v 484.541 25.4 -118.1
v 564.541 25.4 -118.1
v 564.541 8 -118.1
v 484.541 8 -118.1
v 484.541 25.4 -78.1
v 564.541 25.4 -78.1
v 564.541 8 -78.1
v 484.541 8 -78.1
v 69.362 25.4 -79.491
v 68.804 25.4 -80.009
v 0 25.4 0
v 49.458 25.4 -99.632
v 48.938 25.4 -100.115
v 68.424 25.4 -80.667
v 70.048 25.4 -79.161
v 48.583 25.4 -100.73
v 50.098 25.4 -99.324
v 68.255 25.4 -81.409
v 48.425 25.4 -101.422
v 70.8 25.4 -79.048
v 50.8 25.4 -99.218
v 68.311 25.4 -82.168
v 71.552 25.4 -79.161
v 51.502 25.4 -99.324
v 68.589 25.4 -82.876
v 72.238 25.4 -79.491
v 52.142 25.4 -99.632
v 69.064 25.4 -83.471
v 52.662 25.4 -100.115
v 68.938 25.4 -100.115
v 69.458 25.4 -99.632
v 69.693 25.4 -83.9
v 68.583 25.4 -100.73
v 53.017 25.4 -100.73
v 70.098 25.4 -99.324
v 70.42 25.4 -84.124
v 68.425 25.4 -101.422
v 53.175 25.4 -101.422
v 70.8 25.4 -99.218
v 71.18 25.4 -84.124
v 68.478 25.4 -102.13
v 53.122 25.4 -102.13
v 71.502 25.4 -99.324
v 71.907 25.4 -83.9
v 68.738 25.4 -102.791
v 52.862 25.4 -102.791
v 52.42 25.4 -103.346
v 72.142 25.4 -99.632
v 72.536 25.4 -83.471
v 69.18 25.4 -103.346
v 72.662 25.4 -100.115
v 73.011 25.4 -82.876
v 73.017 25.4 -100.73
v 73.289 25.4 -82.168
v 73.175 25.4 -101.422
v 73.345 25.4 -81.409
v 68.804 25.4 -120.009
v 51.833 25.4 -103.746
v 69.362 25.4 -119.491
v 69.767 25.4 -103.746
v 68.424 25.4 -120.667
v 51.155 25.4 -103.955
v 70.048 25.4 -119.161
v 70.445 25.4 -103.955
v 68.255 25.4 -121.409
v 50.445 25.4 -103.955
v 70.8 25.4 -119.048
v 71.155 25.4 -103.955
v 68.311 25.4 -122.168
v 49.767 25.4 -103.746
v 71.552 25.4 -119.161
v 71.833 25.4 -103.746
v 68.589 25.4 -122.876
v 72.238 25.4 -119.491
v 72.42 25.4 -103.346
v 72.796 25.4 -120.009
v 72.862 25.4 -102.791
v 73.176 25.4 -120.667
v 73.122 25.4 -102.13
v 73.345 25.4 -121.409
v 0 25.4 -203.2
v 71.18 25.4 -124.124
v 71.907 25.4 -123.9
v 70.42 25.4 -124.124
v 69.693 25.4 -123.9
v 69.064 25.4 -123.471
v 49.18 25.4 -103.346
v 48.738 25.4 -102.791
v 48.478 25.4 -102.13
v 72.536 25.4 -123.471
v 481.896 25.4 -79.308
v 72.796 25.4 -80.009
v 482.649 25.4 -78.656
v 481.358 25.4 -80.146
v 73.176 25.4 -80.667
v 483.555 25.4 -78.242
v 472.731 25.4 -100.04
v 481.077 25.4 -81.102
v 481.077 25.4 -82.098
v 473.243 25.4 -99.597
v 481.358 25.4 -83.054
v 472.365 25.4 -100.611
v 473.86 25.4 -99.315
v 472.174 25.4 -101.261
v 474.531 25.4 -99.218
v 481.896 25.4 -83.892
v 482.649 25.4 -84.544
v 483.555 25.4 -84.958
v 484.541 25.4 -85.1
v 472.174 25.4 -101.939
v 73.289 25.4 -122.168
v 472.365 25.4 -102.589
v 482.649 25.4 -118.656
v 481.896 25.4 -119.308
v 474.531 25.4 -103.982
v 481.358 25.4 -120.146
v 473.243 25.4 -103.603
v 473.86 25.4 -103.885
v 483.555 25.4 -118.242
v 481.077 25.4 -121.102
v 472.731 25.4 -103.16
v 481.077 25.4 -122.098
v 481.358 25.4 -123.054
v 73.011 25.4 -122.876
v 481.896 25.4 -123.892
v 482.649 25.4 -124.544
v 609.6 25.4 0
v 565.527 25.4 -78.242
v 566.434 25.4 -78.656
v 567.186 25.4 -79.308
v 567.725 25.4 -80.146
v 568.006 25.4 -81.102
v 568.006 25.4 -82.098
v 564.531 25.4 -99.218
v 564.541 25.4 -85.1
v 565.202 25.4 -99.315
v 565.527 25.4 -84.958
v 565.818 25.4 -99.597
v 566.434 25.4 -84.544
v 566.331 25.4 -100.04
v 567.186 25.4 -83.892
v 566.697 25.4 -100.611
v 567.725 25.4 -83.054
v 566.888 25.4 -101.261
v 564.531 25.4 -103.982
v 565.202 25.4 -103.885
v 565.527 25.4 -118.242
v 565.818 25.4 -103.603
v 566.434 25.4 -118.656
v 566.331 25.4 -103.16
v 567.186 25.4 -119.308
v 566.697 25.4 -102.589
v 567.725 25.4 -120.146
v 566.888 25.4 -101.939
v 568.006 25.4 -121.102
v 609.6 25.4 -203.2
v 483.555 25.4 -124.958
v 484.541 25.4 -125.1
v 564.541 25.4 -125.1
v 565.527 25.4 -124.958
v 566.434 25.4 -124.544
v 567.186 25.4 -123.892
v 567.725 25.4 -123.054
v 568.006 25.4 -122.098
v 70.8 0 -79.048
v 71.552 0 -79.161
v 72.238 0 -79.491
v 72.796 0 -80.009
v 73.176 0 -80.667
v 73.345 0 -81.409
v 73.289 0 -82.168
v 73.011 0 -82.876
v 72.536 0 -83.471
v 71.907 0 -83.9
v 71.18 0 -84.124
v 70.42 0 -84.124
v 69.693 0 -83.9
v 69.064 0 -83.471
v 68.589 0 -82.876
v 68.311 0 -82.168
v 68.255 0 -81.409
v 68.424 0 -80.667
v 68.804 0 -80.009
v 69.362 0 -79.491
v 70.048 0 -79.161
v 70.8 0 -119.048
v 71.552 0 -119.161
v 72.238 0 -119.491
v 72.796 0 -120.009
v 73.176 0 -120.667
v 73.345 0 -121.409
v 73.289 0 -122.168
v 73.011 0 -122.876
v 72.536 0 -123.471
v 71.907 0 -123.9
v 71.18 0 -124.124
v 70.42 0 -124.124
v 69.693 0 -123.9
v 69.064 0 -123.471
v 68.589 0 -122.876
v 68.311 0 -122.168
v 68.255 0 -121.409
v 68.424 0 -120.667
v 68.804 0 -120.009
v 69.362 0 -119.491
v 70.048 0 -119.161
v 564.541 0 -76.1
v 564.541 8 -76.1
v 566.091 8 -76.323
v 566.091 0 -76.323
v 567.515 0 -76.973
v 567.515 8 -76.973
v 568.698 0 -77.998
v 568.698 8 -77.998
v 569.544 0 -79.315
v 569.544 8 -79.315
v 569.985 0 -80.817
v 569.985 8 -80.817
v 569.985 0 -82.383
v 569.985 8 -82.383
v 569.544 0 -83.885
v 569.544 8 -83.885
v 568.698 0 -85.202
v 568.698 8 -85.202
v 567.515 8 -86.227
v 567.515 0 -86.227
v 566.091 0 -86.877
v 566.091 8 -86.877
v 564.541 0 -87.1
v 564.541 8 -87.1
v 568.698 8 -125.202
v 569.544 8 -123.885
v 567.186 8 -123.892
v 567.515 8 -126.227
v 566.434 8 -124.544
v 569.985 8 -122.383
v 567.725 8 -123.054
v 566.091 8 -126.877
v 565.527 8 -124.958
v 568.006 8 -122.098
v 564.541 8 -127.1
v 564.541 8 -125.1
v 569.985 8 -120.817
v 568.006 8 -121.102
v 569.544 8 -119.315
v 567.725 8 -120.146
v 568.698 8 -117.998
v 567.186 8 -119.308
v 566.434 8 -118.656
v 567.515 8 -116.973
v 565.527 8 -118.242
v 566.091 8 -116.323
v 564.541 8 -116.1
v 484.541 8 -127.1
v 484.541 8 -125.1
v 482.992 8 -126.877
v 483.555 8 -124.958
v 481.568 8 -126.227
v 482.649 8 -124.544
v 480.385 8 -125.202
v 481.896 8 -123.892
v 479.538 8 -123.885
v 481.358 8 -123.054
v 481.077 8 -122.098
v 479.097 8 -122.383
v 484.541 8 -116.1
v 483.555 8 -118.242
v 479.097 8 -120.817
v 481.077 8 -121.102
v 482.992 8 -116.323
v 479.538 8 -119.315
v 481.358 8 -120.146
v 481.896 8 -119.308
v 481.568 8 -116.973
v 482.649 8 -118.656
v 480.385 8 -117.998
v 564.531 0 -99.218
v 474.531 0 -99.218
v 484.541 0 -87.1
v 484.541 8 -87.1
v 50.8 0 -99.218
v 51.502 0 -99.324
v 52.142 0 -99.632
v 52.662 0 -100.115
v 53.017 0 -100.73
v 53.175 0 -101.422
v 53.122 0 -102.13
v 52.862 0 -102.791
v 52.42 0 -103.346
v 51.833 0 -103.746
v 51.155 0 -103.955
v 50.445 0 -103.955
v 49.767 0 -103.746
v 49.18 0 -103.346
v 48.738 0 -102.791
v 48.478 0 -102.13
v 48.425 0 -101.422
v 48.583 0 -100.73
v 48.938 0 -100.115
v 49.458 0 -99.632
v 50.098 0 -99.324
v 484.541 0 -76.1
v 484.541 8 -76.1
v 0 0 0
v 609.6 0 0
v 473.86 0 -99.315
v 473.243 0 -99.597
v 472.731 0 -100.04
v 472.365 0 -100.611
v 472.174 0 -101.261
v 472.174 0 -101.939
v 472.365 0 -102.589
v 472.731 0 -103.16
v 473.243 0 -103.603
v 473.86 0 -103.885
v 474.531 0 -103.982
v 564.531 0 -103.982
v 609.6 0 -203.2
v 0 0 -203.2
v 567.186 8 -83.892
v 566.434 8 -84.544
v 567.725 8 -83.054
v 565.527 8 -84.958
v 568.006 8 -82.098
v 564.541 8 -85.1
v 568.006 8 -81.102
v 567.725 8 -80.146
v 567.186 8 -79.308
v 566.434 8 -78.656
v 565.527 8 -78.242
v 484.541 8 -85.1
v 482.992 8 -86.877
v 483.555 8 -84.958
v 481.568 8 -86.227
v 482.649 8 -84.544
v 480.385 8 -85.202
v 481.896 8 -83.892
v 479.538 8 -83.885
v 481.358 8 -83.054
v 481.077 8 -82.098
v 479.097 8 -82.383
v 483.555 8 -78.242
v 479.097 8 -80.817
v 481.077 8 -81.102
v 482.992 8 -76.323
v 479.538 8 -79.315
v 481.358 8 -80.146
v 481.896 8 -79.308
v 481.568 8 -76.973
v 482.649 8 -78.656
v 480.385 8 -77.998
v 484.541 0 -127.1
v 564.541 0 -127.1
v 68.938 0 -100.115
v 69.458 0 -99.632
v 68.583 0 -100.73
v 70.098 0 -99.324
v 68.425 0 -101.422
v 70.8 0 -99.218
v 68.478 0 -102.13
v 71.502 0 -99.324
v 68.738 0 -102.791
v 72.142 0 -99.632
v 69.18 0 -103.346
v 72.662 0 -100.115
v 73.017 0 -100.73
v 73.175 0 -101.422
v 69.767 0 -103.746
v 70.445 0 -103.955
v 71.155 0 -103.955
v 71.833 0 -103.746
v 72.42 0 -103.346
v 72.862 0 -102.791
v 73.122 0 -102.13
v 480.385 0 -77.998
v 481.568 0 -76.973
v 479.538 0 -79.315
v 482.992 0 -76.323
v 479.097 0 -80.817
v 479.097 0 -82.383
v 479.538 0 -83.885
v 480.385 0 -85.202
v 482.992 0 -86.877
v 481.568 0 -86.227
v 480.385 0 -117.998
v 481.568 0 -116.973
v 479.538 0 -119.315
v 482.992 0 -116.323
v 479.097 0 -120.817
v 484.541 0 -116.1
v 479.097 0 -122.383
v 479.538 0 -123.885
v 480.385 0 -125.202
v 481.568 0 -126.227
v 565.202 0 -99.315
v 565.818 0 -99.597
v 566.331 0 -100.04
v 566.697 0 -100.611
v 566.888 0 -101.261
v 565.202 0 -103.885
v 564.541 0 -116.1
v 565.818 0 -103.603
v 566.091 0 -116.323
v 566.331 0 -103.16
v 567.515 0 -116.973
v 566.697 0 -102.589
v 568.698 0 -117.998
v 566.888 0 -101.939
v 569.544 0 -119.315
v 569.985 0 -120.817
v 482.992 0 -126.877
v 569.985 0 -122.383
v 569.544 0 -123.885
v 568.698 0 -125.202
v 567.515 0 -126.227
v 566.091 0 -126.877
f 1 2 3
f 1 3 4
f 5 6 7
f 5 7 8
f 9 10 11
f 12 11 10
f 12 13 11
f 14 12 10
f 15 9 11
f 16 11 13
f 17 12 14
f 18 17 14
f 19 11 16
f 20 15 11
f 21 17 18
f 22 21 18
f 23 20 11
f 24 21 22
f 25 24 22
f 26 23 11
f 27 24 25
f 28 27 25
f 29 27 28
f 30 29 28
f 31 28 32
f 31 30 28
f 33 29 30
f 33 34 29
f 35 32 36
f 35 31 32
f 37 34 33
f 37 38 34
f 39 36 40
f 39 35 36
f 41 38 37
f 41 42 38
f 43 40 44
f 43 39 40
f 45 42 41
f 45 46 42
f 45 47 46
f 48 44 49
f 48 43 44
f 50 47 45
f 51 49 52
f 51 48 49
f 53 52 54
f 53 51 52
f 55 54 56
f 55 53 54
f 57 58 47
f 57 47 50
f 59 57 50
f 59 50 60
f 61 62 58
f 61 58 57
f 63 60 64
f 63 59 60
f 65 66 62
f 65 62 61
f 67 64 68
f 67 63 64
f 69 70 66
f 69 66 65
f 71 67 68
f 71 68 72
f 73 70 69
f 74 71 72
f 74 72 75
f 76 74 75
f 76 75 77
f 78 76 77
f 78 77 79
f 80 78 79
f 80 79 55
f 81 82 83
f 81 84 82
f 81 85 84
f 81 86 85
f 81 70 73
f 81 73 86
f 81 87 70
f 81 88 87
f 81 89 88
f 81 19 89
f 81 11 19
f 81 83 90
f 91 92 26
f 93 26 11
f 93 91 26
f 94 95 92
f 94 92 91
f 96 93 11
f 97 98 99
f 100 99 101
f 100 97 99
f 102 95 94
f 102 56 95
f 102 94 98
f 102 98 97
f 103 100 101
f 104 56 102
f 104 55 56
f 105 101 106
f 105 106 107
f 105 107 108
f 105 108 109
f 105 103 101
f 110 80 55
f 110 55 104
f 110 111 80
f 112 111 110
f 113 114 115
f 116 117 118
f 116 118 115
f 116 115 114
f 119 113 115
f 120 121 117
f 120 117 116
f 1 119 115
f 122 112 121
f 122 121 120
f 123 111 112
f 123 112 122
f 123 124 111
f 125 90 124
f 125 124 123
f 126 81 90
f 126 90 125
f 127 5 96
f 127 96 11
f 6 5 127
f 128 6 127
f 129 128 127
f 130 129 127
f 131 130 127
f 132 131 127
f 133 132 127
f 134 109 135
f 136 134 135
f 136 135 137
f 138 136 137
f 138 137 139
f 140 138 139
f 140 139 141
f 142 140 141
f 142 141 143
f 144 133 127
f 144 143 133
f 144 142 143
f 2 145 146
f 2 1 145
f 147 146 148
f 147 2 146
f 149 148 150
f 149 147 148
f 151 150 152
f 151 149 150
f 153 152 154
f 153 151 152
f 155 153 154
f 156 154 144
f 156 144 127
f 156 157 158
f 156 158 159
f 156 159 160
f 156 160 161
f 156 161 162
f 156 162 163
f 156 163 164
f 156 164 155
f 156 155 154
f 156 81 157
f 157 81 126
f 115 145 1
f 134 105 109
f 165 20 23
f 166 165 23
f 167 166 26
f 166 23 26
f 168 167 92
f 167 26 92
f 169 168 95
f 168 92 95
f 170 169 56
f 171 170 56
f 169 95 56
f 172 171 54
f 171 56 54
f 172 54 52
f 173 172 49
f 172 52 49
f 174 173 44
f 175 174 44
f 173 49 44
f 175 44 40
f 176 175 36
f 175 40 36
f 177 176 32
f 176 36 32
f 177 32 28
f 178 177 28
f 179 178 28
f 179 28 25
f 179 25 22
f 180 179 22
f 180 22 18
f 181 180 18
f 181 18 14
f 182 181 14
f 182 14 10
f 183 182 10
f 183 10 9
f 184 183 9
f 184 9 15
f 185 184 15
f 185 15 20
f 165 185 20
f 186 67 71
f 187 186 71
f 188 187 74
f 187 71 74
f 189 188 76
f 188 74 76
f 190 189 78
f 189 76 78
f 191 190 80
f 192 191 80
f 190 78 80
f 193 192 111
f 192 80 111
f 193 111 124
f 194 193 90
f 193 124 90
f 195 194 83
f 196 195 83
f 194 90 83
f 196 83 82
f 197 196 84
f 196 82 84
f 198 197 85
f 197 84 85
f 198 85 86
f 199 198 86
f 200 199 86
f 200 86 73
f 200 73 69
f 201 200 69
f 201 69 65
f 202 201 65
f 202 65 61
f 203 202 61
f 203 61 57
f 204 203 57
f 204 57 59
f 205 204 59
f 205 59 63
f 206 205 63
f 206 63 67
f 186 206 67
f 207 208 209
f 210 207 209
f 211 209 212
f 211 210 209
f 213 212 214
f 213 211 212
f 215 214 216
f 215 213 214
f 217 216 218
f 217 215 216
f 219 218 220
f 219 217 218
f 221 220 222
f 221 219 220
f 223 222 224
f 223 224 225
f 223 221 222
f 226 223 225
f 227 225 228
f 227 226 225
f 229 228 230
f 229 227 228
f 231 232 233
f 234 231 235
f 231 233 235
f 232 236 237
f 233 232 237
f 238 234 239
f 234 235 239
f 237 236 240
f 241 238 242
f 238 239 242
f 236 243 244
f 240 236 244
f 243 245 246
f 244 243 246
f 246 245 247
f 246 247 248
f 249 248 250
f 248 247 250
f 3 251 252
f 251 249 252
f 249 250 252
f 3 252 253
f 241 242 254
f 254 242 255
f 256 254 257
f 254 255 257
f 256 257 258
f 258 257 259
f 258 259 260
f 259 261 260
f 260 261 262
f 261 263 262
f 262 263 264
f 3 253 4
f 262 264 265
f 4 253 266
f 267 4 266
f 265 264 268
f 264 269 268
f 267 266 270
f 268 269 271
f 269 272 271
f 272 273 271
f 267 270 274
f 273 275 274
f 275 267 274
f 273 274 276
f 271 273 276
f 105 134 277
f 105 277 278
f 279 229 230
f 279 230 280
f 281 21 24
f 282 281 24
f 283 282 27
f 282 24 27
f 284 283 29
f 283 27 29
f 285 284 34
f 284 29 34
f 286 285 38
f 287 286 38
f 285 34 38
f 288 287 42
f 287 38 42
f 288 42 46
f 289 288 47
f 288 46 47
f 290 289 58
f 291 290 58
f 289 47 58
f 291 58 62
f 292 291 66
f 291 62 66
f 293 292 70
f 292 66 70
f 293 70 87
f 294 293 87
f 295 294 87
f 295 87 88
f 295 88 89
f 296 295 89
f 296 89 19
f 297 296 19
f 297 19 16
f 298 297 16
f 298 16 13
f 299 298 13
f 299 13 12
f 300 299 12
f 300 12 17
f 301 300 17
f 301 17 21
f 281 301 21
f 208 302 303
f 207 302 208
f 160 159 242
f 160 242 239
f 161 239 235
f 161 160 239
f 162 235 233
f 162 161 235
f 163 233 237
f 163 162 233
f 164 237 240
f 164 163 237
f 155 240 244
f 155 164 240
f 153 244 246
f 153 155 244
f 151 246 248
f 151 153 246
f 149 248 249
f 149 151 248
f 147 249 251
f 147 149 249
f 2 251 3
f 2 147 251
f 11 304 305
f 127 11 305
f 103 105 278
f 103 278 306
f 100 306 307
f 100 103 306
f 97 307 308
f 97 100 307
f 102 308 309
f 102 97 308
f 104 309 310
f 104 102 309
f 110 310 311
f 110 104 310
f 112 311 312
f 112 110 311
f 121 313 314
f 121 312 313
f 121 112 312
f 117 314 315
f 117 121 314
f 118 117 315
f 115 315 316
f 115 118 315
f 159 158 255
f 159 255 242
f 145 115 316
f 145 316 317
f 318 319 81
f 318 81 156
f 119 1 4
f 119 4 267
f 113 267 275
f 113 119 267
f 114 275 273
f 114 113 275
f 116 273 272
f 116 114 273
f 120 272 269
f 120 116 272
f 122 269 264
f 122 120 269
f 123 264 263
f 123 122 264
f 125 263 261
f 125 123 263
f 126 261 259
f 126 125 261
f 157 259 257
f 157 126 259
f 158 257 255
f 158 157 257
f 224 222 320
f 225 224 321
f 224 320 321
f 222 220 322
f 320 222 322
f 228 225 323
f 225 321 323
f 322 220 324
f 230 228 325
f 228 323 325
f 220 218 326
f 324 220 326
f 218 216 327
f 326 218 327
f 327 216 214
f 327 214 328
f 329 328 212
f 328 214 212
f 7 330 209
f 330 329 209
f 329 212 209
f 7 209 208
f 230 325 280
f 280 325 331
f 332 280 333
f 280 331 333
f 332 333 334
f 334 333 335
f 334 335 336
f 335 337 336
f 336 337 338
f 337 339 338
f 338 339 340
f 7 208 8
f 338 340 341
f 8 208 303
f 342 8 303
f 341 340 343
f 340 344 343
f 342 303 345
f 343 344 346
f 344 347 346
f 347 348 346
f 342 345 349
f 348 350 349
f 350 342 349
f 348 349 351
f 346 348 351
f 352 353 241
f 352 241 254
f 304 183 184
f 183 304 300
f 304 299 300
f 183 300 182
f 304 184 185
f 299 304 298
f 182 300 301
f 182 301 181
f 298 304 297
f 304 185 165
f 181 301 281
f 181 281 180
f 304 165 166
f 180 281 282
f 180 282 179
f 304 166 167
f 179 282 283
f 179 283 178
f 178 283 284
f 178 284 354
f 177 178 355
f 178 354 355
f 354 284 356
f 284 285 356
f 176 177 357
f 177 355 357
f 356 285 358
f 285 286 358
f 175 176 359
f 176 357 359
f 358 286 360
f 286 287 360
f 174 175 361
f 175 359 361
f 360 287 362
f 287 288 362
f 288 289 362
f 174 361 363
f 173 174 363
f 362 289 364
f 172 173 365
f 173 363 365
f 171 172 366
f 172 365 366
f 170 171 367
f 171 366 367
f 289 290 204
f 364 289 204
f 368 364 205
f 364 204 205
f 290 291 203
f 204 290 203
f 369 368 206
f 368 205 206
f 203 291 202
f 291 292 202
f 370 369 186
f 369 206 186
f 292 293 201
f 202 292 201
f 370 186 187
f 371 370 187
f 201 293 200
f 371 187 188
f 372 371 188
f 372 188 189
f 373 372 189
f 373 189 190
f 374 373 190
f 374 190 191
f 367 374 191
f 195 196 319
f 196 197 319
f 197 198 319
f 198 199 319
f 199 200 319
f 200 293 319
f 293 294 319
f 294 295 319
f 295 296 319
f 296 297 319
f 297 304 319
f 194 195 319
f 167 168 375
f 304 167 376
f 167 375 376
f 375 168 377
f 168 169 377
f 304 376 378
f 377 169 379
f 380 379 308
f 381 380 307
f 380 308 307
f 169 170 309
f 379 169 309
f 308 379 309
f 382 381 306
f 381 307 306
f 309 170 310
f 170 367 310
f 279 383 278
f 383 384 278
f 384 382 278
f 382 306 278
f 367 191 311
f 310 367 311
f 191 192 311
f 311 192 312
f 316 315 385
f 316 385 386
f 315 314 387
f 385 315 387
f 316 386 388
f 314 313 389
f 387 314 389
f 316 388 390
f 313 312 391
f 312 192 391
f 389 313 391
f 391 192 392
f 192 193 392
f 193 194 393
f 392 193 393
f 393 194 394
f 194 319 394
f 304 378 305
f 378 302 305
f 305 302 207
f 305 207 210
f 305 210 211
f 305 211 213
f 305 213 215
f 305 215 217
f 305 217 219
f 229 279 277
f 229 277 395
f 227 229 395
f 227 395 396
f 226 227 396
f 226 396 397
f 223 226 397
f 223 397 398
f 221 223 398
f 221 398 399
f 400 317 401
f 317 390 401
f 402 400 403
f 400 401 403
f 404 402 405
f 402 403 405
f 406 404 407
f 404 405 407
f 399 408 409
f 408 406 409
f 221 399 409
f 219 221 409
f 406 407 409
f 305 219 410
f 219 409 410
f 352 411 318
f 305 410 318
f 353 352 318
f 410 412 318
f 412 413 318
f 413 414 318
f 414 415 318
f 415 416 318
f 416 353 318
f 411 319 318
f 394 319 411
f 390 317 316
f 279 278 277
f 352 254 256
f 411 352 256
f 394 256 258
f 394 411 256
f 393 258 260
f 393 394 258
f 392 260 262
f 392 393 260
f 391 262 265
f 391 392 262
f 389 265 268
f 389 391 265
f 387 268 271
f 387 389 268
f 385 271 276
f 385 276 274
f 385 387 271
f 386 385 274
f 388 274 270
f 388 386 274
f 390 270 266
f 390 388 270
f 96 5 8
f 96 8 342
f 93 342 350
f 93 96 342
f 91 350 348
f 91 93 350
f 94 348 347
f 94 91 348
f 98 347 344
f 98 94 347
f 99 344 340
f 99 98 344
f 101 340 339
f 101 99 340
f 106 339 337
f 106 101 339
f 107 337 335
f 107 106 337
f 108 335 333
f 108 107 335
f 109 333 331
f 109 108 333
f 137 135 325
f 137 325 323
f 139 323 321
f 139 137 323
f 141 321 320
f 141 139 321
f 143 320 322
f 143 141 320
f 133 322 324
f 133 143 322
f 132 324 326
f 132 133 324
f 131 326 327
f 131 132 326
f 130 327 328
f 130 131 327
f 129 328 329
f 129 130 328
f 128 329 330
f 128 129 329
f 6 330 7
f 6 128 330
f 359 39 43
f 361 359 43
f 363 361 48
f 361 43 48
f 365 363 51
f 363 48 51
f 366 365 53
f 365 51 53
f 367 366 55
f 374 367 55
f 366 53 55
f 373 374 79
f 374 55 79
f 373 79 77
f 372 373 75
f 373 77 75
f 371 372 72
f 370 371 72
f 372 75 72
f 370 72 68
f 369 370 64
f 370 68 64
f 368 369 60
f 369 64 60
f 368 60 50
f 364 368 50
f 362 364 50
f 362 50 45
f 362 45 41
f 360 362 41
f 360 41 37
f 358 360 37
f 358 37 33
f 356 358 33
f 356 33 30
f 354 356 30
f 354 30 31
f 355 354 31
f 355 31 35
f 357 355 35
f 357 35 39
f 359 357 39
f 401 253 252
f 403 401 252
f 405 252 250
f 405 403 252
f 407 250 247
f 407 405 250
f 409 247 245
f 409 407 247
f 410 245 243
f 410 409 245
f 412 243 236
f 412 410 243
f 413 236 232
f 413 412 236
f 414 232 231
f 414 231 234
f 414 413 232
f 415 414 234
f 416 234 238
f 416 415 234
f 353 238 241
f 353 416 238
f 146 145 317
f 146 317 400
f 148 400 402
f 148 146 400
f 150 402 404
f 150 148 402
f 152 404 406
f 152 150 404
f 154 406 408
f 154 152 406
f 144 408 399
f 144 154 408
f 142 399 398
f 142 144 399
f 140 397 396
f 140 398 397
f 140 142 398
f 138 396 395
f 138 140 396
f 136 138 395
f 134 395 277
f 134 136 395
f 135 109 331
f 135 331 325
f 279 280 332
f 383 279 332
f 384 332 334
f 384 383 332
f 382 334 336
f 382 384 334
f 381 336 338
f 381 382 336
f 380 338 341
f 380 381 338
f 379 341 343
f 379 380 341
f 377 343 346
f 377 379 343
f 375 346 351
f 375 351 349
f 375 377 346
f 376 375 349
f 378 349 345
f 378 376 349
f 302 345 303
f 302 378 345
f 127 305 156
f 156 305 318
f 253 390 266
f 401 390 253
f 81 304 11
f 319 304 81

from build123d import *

# Parameters (mm, degrees)
SKETCH1_W           = 609.6
SKETCH1_H           = 203.2
BOSS_EXTRUDE1_DEPTH = 25.4
SKETCH2_R           = 2.3815
SKETCH2_R_2         = 2.5525
CUT_EXTRUDE2_DEPTH  = 26.4
CUT_EXTRUDE3_DEPTH  = 8


with BuildPart() as part:
    # Sketch1 → Boss-Extrude1 (new body)
    with BuildSketch(Plane(origin=(0, 0, 0), x_dir=(1, 0, 0), z_dir=(0, 1, 0))):
        with Locations((304.8, 101.6)):
            Rectangle(SKETCH1_W, SKETCH1_H)
    extrude(amount=BOSS_EXTRUDE1_DEPTH)

    # Sketch2 → Cut-Extrude2 (cut, through all)
    with BuildSketch(Plane(origin=(0, 25.4, 0), x_dir=(1, 0, 0), z_dir=(0, 1, 0))):
        with Locations(Location((50.8, 101.6, 0), (0, 0, 270))):  # turned: the seam where the file's is
            Circle(SKETCH2_R)
        with Locations(Location((70.8, 101.6, 0), (0, 0, 270))):  # turned: the seam where the file's is
            Circle(SKETCH2_R)
        with Locations(Location((70.8, 121.6, 0), (0, 0, 270))):  # turned: the seam where the file's is
            Circle(SKETCH2_R_2)
        with Locations(Location((70.8, 81.6, 0), (0, 0, 270))):  # turned: the seam where the file's is
            Circle(SKETCH2_R_2)
        with BuildLine():
            Line((474.530890234, 103.9815), (564.530890234, 103.9815))
            ThreePointArc((564.530890234, 103.9815), (566.912390234, 101.6), (564.530890234, 99.2185))
            Line((564.530890234, 99.2185), (474.530890234, 99.2185))
            ThreePointArc((474.530890234, 99.2185), (472.149390234, 101.6), (474.530890234, 103.9815))
        make_face()
        with BuildLine():
            Line((484.541340045, 125.1), (564.541340045, 125.1))
            ThreePointArc((564.541340045, 125.1), (568.041340045, 121.6), (564.541340045, 118.1))
            Line((564.541340045, 118.1), (484.541340045, 118.1))
            ThreePointArc((484.541340045, 118.1), (481.041340045, 121.6), (484.541340045, 125.1))
        make_face()
        with BuildLine():
            Line((484.541340045, 85.1), (564.541340045, 85.1))
            ThreePointArc((564.541340045, 85.1), (568.041340045, 81.6), (564.541340045, 78.1))
            Line((564.541340045, 78.1), (484.541340045, 78.1))
            ThreePointArc((484.541340045, 78.1), (481.041340045, 81.6), (484.541340045, 85.1))
        make_face()
    extrude(amount=-CUT_EXTRUDE2_DEPTH, mode=Mode.SUBTRACT)

    # Sketch7 → Cut-Extrude3 (cut)
    with BuildSketch(Plane.XZ):
        with BuildLine():
            Line((484.541340045, -76.1), (564.541340045, -76.1))
            ThreePointArc((564.541340045, -76.1), (570.041340045, -81.6), (564.541340045, -87.1))
            Line((564.541340045, -87.1), (484.541340045, -87.1))
            ThreePointArc((484.541340045, -87.1), (479.041340045, -81.6), (484.541340045, -76.1))
        make_face()
        with BuildLine():
            Line((484.541340045, -116.1), (564.541340045, -116.1))
            ThreePointArc((564.541340045, -116.1), (570.041340045, -121.6), (564.541340045, -127.1))
            Line((564.541340045, -127.1), (484.541340045, -127.1))
            ThreePointArc((484.541340045, -127.1), (479.041340045, -121.6), (484.541340045, -116.1))
        make_face()
    extrude(amount=-CUT_EXTRUDE3_DEPTH, mode=Mode.SUBTRACT)


solid = part.part
